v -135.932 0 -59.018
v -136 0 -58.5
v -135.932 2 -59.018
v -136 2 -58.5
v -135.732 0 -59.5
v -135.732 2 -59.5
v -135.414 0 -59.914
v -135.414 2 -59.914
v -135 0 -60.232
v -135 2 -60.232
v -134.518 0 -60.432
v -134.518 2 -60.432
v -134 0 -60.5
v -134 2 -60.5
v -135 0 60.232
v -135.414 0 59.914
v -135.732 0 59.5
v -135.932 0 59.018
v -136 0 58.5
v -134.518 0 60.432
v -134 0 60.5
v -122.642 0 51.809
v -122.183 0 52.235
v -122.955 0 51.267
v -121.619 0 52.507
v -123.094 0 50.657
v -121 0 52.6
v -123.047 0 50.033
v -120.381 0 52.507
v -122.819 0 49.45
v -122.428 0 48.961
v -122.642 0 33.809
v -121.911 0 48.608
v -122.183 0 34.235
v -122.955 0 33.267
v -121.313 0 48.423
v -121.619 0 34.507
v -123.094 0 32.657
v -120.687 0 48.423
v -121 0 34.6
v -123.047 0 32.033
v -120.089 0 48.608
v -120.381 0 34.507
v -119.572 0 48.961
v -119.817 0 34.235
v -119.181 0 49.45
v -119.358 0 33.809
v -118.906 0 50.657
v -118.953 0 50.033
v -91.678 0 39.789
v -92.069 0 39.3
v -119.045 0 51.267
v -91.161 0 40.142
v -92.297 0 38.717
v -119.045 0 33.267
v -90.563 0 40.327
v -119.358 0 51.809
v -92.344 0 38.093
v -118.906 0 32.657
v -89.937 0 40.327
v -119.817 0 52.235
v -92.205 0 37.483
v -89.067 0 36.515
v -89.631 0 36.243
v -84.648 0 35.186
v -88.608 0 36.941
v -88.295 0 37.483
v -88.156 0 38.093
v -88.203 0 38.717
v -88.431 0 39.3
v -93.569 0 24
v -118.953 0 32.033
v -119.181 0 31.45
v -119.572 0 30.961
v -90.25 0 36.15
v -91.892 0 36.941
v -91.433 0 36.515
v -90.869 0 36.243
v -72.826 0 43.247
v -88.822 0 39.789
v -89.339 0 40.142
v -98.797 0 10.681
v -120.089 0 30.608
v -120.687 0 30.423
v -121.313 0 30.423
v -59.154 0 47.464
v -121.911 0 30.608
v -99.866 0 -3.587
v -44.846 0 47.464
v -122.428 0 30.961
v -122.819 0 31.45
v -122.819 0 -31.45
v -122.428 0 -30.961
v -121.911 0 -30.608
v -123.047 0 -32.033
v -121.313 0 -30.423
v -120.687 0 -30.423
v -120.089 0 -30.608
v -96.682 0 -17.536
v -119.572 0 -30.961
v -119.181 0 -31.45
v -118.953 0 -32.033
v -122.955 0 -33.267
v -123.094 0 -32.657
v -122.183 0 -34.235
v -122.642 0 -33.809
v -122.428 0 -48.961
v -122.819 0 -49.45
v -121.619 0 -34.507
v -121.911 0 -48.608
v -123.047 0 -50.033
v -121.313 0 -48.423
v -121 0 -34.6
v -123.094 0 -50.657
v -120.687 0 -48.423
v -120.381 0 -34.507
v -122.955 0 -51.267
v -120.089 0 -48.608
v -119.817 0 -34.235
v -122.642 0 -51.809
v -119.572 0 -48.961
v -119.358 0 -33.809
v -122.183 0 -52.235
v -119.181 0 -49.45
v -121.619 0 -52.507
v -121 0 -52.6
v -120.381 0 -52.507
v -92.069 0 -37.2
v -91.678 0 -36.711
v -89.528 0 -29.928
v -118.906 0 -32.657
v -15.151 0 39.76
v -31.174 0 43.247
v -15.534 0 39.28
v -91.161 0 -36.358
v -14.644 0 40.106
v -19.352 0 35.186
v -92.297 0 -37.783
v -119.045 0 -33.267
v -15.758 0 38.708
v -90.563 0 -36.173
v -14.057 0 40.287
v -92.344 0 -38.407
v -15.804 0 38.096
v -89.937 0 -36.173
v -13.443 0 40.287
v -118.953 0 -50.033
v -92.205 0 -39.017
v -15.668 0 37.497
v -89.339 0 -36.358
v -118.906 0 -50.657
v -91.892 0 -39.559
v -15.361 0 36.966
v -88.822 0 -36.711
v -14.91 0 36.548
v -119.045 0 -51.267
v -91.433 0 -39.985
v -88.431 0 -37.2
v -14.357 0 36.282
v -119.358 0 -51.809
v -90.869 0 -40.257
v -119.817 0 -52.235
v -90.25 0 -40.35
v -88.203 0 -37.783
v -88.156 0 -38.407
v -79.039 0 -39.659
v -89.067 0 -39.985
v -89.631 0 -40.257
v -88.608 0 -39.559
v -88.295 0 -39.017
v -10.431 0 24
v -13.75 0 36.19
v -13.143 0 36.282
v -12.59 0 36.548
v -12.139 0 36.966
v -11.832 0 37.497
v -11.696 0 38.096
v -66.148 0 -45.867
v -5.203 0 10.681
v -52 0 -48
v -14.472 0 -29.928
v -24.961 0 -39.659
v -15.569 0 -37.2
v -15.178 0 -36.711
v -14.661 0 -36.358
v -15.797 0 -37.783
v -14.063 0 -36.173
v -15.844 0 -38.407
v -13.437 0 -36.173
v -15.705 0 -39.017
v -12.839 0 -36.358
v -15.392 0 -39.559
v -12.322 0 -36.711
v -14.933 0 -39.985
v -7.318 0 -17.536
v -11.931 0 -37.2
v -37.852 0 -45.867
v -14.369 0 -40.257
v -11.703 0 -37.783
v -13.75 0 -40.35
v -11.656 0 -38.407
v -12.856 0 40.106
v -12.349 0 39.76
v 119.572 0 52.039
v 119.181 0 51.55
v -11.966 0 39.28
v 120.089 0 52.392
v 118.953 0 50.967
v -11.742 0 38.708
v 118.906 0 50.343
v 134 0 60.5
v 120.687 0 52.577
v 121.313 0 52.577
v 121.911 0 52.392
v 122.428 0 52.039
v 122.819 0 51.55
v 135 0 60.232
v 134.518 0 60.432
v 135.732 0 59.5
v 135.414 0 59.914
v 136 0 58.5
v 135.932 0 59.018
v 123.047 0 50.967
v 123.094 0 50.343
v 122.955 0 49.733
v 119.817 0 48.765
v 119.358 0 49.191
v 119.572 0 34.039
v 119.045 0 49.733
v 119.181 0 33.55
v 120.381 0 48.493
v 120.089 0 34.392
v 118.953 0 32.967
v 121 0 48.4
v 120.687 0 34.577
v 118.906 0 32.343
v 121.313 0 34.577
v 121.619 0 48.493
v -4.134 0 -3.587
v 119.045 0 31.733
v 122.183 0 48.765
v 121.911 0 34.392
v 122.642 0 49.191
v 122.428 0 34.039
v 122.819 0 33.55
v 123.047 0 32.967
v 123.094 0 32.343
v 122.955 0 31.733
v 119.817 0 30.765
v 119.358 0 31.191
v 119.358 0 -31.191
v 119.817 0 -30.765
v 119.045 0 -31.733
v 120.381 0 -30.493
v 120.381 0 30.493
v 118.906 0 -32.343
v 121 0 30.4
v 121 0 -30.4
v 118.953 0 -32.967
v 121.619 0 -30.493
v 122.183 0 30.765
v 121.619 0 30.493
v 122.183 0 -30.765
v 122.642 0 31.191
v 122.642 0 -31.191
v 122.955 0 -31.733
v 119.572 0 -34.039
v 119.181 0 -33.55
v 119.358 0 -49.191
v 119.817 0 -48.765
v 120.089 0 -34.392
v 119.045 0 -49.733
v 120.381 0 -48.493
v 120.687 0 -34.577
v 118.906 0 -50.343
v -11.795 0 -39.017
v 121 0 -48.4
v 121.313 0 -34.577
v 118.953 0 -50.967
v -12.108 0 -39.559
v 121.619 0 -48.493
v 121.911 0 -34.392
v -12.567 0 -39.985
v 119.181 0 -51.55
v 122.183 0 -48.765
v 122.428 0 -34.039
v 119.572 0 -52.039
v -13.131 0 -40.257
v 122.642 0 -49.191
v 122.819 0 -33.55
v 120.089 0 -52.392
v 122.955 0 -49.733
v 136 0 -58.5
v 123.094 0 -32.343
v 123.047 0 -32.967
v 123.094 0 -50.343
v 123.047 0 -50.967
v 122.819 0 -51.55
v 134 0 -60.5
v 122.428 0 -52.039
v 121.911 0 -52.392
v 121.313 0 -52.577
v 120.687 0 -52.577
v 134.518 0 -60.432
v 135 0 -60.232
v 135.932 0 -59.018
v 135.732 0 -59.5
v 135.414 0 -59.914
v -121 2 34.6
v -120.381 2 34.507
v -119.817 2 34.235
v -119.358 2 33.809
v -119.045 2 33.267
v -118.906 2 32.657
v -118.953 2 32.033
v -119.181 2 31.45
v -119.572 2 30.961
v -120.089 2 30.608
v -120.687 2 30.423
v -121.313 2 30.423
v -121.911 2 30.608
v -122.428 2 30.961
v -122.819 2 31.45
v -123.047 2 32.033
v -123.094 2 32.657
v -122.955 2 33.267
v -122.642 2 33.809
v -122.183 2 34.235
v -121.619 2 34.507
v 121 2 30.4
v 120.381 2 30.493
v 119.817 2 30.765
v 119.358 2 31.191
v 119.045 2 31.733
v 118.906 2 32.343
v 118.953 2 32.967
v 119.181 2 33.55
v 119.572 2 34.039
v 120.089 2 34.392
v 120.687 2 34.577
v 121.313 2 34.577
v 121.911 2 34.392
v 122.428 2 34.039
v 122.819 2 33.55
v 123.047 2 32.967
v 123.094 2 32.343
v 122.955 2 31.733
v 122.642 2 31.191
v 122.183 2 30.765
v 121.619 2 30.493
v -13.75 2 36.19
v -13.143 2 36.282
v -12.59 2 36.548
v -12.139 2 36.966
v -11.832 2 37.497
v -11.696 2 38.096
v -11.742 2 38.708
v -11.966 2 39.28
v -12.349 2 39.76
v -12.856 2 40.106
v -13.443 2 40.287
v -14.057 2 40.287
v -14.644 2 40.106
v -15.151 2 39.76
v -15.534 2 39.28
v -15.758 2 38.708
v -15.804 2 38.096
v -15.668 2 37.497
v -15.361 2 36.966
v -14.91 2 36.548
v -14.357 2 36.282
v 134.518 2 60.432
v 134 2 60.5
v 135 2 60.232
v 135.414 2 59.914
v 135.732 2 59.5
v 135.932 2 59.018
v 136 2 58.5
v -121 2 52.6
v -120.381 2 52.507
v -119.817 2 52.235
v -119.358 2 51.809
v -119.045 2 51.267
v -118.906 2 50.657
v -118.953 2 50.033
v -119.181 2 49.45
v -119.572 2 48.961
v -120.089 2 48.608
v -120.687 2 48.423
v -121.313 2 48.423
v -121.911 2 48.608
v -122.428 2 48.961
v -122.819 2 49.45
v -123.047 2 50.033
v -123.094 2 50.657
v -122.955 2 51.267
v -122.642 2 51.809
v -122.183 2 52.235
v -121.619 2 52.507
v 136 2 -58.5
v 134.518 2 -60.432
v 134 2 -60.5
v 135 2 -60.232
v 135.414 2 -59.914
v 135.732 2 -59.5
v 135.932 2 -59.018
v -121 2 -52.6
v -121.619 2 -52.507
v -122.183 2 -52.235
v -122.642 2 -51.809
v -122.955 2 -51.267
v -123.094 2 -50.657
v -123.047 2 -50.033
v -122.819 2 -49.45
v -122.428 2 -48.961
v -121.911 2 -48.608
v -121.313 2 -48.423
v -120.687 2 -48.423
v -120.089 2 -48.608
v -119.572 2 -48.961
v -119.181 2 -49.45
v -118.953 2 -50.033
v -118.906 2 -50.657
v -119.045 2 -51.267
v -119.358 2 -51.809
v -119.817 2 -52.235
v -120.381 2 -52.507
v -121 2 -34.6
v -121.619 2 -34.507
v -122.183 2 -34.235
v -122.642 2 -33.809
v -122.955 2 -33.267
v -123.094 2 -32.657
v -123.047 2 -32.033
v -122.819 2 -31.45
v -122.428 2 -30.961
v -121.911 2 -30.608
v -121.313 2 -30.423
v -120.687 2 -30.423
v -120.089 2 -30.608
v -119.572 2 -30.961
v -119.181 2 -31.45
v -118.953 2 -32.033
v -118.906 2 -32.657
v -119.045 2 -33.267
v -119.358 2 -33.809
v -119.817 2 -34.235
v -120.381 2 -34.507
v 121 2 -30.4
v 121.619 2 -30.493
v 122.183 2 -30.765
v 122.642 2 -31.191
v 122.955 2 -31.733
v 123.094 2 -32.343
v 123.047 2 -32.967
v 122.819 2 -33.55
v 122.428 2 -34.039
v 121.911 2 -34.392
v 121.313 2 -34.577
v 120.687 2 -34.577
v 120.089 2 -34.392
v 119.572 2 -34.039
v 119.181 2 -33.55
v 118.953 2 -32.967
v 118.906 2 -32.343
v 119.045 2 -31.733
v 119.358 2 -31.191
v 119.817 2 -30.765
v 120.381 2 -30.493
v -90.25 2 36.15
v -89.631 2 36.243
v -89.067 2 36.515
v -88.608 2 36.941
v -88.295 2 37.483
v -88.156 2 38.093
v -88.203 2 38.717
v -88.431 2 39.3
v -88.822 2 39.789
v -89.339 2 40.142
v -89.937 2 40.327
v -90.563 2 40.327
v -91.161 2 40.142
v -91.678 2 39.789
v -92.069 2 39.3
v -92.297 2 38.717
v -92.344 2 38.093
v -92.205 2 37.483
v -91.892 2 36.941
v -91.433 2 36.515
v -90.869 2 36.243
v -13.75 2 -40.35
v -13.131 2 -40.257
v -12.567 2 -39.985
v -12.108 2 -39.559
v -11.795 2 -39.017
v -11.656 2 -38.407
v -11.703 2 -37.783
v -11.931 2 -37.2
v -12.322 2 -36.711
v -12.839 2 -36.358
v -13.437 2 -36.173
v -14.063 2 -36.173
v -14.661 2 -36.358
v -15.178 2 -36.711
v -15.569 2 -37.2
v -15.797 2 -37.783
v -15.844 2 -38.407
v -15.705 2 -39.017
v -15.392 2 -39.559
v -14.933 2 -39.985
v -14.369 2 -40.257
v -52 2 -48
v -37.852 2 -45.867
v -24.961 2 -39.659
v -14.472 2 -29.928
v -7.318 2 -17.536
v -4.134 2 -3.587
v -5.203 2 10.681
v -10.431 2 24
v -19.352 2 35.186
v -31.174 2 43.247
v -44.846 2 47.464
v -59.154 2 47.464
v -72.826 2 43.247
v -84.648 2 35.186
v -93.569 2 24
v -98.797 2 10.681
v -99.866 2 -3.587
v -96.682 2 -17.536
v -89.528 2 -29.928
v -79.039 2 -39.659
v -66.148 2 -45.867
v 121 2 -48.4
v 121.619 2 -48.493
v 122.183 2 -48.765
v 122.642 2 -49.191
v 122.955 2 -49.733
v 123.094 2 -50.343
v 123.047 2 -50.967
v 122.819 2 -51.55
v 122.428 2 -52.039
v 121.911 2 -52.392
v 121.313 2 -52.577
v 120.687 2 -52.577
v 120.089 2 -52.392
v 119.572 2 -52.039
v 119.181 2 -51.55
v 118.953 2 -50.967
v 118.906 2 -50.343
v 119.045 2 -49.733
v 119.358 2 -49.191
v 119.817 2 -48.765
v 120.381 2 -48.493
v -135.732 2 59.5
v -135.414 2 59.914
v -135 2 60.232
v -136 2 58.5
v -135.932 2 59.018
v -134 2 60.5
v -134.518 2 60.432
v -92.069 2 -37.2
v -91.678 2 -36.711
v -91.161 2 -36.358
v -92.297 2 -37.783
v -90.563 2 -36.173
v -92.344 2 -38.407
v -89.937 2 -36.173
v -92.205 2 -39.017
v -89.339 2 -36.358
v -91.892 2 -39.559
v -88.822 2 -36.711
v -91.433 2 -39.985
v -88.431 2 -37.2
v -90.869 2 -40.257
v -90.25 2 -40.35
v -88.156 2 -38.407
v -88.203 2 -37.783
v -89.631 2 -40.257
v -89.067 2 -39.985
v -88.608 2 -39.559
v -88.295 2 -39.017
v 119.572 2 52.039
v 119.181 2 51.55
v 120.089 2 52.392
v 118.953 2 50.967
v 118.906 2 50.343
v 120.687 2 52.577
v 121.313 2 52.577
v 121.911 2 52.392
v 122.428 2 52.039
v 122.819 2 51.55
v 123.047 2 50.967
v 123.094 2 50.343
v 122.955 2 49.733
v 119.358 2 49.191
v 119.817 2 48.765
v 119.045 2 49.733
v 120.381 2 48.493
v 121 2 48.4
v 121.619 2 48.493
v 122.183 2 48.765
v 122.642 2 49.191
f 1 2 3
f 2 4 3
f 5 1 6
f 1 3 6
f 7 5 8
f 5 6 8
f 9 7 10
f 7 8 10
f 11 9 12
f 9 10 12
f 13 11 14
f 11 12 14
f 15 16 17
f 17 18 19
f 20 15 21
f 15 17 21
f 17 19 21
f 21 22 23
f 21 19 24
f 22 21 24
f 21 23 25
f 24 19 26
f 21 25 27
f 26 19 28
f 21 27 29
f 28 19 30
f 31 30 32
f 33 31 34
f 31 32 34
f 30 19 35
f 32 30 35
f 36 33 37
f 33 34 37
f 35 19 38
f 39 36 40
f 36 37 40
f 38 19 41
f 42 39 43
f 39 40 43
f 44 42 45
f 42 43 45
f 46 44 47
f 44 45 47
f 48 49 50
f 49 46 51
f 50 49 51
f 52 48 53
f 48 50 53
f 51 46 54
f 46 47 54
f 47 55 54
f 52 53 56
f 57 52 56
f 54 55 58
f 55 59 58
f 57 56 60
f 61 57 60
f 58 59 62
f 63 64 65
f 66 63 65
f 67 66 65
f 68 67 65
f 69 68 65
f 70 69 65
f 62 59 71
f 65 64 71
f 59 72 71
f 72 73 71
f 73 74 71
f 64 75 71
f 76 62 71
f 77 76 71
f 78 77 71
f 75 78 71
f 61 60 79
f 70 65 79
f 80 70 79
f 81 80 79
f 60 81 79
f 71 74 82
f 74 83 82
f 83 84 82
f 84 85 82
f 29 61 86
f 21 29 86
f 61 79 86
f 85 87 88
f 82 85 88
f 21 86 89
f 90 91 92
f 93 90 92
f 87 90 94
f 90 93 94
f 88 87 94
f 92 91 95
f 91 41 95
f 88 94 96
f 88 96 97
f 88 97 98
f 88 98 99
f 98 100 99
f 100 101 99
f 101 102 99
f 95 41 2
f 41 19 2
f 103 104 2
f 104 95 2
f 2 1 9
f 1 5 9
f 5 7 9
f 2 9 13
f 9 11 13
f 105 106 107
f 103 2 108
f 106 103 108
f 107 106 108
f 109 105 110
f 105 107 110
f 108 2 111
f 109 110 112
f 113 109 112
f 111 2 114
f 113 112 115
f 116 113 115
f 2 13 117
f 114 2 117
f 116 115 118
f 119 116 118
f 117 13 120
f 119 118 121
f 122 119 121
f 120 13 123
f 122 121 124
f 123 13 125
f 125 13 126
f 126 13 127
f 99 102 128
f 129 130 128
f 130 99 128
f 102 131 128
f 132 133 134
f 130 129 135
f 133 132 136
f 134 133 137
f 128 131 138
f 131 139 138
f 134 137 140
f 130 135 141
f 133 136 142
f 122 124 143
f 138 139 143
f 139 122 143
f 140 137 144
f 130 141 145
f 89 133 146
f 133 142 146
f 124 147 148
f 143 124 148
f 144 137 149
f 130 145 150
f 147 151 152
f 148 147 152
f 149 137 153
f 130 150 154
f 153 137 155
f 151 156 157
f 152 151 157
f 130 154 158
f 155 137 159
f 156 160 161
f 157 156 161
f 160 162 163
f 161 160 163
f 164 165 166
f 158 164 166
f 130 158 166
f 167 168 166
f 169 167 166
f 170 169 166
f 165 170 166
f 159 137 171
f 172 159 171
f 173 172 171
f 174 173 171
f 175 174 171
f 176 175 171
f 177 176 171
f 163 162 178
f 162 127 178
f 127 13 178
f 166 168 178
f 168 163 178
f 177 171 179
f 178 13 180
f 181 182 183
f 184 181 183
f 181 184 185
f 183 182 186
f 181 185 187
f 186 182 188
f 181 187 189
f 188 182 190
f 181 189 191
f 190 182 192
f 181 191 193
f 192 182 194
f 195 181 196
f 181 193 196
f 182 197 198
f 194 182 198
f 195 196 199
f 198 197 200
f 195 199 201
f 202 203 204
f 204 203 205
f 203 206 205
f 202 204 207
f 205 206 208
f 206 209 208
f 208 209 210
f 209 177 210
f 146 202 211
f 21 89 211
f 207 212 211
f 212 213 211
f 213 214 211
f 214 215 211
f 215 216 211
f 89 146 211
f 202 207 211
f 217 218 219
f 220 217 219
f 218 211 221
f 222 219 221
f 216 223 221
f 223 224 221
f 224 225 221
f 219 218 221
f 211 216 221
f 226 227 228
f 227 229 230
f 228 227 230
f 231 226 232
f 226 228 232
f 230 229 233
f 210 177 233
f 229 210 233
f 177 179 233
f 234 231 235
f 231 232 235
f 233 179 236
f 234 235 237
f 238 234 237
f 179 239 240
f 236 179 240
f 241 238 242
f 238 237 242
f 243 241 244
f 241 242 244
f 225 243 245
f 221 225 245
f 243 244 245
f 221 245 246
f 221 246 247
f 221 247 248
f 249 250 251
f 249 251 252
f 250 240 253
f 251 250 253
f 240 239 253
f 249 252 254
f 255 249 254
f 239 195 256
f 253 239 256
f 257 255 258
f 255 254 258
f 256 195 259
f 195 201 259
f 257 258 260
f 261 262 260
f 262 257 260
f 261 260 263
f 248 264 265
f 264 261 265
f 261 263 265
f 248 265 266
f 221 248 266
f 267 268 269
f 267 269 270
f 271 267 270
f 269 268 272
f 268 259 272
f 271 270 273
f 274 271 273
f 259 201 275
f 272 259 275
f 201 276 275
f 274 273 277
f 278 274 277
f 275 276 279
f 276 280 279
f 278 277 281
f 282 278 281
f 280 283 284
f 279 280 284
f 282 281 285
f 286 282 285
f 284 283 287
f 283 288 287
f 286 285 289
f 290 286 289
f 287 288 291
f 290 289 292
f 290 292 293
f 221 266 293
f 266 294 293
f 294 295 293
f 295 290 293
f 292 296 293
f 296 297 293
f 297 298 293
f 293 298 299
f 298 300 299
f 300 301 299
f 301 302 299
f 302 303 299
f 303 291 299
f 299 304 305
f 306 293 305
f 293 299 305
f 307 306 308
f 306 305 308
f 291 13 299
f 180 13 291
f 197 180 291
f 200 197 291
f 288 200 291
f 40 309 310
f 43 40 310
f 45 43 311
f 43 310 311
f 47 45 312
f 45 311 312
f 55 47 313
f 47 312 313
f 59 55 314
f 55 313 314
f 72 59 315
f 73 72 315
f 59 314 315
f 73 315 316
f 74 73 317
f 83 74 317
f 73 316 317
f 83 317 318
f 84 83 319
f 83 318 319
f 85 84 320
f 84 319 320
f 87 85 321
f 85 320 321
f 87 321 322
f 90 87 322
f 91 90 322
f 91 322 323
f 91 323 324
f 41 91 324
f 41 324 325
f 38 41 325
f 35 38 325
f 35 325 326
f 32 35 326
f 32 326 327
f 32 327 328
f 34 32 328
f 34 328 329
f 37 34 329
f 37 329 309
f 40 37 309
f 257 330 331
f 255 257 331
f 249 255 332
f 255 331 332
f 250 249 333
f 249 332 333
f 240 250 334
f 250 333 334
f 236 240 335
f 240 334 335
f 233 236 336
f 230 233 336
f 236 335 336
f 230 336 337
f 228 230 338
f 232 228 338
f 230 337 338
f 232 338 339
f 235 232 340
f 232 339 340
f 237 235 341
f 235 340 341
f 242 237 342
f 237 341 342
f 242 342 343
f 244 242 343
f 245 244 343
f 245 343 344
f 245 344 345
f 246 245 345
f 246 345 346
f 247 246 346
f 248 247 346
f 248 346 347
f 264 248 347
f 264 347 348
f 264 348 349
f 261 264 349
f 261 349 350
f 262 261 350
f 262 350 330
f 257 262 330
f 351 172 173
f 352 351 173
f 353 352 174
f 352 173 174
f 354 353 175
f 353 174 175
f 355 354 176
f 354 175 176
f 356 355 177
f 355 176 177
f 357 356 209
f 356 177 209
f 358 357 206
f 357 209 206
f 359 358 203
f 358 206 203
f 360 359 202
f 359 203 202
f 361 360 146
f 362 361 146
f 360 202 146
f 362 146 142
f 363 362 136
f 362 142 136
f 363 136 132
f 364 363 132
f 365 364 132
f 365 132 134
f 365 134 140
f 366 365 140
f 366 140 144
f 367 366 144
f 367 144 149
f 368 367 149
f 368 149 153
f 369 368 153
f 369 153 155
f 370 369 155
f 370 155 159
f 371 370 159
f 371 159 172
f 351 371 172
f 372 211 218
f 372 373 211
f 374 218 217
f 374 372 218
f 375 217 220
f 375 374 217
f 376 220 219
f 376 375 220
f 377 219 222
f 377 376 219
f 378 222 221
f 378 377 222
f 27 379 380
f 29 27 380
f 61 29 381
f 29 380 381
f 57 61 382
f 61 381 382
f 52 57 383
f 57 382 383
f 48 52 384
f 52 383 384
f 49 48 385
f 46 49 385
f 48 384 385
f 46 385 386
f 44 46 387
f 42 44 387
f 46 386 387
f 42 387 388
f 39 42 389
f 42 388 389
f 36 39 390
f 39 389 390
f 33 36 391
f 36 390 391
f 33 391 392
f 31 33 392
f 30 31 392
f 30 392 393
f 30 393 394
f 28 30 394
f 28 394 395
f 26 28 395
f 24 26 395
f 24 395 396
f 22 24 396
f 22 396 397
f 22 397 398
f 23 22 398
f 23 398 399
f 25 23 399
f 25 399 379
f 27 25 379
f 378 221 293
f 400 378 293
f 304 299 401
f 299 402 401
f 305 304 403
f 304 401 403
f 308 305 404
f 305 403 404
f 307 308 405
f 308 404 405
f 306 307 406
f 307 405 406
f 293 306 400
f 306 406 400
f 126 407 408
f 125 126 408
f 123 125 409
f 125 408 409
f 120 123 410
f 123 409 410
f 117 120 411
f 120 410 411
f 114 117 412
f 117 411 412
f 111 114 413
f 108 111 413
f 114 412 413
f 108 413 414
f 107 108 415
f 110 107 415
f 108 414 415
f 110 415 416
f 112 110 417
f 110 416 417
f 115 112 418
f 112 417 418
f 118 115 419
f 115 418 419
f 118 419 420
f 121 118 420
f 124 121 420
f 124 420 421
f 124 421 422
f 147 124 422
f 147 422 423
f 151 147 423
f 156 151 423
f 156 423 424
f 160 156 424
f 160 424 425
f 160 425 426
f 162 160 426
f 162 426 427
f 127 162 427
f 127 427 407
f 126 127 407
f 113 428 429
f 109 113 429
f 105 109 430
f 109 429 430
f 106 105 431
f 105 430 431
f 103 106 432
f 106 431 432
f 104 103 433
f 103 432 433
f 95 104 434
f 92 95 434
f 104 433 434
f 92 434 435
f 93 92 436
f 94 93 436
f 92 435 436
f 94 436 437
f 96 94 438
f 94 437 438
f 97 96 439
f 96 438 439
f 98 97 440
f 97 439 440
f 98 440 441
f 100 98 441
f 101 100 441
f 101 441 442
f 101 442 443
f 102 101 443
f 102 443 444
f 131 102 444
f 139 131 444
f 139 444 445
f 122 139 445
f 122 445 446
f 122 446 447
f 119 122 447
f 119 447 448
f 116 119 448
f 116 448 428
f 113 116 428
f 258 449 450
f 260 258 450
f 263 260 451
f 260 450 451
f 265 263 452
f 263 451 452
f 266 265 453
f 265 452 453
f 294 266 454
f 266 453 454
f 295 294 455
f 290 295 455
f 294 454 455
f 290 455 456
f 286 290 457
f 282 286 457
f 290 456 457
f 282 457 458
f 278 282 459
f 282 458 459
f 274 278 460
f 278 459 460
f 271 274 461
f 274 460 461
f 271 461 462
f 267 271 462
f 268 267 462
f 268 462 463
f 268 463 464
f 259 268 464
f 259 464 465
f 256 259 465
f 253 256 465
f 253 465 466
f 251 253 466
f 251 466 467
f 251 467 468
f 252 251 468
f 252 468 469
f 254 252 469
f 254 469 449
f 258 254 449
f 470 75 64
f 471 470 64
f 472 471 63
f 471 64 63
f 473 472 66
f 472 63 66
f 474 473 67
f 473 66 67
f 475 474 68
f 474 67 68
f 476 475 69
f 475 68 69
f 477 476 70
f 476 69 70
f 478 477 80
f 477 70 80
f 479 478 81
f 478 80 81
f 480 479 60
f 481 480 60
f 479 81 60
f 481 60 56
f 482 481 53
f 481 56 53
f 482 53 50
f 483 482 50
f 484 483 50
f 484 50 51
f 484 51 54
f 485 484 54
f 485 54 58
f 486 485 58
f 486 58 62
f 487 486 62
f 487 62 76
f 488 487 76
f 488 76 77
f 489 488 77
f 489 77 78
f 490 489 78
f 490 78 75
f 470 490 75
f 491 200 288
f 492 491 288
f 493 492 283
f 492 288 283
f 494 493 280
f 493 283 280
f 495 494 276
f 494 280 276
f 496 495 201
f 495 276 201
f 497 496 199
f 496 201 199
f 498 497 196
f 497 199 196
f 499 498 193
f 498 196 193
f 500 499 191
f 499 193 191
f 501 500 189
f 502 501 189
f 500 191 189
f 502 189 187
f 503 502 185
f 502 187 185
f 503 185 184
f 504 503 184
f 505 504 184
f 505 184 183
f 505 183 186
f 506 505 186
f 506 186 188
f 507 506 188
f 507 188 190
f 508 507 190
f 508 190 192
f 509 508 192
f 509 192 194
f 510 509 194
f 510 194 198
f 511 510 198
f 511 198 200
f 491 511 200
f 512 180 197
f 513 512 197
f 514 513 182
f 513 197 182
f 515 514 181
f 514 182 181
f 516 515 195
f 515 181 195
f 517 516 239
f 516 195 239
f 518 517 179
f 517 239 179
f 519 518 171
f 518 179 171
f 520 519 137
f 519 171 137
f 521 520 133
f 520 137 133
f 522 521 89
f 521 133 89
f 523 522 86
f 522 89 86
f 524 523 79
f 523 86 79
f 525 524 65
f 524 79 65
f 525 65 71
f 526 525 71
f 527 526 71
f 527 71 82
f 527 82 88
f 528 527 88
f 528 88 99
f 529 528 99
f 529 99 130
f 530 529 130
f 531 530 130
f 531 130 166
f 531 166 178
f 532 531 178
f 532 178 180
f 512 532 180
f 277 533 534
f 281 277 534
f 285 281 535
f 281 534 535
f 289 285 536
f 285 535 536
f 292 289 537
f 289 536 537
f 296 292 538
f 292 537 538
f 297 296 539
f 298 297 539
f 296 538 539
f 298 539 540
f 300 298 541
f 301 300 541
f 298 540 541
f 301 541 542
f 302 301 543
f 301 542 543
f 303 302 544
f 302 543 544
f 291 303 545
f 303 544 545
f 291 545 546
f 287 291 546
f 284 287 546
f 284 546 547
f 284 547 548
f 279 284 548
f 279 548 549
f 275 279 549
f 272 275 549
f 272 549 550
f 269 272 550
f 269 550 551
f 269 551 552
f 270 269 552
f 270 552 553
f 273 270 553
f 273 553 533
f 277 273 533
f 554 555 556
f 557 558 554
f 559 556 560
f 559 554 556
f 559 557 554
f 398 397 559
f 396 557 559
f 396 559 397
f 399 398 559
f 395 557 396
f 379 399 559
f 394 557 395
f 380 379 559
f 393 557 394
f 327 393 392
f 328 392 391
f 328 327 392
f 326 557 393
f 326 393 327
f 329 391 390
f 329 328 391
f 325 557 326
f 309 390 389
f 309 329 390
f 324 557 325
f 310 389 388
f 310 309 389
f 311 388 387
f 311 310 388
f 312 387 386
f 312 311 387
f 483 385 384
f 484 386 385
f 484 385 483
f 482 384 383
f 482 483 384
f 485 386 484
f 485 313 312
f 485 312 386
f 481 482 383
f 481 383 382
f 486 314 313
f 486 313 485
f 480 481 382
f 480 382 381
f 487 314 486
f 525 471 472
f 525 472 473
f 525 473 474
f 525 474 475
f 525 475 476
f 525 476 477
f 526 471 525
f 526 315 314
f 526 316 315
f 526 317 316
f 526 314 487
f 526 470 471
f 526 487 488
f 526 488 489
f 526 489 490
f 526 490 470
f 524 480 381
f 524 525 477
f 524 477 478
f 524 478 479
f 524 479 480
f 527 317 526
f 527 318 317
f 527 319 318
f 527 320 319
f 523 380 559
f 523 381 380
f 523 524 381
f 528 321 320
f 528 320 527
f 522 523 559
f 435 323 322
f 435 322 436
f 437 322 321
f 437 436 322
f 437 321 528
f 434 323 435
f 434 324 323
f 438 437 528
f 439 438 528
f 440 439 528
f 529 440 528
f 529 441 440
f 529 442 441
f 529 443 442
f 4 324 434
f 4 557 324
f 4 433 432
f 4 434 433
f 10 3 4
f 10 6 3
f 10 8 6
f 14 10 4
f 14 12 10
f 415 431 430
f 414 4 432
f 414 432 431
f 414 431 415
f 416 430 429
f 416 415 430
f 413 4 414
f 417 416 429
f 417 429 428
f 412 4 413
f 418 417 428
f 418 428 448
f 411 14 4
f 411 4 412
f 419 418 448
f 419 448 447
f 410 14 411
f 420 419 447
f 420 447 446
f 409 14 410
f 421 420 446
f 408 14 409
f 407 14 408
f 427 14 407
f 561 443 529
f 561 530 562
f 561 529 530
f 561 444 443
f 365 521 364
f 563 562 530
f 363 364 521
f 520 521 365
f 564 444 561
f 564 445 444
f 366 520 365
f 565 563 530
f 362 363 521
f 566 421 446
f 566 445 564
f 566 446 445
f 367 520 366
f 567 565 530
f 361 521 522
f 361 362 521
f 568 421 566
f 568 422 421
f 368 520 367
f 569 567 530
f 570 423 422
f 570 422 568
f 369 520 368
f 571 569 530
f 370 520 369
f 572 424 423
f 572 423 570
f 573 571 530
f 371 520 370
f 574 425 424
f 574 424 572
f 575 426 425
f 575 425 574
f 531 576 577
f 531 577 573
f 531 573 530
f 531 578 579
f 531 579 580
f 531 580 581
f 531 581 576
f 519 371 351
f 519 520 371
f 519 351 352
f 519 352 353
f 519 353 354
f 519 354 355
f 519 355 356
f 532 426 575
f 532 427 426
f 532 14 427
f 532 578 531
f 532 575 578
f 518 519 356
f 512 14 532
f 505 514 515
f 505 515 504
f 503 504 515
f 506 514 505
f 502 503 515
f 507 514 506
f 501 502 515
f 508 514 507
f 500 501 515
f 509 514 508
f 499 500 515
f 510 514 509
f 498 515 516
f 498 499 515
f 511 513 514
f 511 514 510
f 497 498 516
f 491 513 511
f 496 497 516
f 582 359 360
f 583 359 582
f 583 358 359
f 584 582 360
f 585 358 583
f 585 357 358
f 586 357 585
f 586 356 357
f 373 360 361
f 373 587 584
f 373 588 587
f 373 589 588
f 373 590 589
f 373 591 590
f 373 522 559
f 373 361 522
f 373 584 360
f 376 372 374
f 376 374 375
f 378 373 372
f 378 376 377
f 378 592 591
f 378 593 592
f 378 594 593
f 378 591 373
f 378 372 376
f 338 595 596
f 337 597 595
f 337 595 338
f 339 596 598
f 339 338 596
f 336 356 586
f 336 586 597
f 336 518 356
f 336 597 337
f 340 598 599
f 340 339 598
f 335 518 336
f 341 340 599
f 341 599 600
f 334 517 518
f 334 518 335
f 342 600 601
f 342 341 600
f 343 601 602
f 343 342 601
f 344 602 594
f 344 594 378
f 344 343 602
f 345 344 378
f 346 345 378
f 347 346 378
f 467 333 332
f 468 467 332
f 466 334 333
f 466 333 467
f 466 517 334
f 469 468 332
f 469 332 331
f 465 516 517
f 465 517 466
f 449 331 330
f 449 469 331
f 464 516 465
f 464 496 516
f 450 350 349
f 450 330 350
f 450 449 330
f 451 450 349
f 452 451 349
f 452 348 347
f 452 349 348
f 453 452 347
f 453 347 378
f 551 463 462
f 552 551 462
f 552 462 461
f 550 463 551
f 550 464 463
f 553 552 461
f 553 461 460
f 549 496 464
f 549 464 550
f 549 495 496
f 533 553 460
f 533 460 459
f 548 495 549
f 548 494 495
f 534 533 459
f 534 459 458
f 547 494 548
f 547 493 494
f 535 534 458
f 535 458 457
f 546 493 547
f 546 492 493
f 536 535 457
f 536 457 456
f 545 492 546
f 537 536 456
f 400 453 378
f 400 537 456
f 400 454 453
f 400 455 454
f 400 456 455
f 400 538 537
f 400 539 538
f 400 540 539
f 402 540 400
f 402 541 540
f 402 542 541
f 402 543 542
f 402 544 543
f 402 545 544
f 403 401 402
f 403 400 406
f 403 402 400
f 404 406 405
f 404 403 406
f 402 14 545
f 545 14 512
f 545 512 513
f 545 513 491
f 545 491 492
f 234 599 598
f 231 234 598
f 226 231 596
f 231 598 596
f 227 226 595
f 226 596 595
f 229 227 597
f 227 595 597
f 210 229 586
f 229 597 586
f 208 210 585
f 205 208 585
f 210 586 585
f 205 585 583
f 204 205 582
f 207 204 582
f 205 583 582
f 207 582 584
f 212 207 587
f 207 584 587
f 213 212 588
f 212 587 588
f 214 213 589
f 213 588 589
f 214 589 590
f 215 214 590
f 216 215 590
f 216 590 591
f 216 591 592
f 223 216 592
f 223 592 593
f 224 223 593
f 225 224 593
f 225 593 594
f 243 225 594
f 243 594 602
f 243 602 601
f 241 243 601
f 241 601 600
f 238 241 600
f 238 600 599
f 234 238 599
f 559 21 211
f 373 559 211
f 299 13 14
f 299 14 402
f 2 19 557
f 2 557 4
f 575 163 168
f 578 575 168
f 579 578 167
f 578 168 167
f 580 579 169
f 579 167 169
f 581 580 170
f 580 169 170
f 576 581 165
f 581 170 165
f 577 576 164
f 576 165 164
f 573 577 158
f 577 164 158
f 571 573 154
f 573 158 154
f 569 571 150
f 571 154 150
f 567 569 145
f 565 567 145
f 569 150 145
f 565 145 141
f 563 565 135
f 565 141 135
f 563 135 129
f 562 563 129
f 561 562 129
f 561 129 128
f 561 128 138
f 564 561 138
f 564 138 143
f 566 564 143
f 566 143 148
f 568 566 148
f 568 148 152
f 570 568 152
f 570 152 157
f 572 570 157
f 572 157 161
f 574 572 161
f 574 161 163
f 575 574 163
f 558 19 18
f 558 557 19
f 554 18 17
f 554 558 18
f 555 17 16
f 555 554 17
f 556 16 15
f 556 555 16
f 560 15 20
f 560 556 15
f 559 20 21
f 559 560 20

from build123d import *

# Parameters (mm, degrees)
SKETCH_1_W          = 272
SKETCH_1_H          = 121
EXTRUDE_1_DEPTH     = 2
SKETCH_2_R          = 2.1
CUT_EXTRUDE_1_DEPTH = 149.863192227
FILLET_1_R          = 2
SKETCH_3_R          = 2.1
SKETCH_3_R_2        = 2.06
SKETCH_3_R_3        = 48
CUT_EXTRUDE_2_DEPTH = 149.863192227


with BuildPart() as part:
    # 草图1 → 凸台-拉伸1 (new body)
    with BuildSketch(Plane(origin=(0, 0, 0), x_dir=(1, 0, 0), z_dir=(0, 1, 0))):
        Rectangle(SKETCH_1_W, SKETCH_1_H)
    extrude(amount=EXTRUDE_1_DEPTH)

    # 草图2 → 切除-拉伸1 (cut, through all)
    with BuildSketch(Plane(origin=(0, 2, 0), x_dir=(1, 0, 0), z_dir=(0, 1, 0))):
        with Locations(Location((121, 50.5, 0), (0, 0, 270))):
            Circle(SKETCH_2_R)
        with Locations(Location((121, 32.5, 0), (0, 0, 270))):
            Circle(SKETCH_2_R)
        with Locations(Location((121, -32.5, 0), (0, 0, 90))):
            Circle(SKETCH_2_R)
        with Locations(Location((121, -50.5, 0), (0, 0, 90))):
            Circle(SKETCH_2_R)
        with Locations(Location((-121, -50.5, 0), (0, 0, 270))):
            Circle(SKETCH_2_R)
        with Locations(Location((-121, -32.5, 0), (0, 0, 270))):
            Circle(SKETCH_2_R)
        with Locations(Location((-121, 32.5, 0), (0, 0, 90))):
            Circle(SKETCH_2_R)
        with Locations(Location((-121, 50.5, 0), (0, 0, 90))):
            Circle(SKETCH_2_R)
    extrude(amount=-CUT_EXTRUDE_1_DEPTH, mode=Mode.SUBTRACT)

    # 圆角1
    fillet_1_edges = [part.edges().sort_by_distance(p)[0] for p in [
        (136, 1, 60.5),
        (-136, 1, 60.5),
        (-136, 1, -60.5),
        (136, 1, -60.5),
    ]]
    fillet(fillet_1_edges, radius=FILLET_1_R)

    # 草图3 → 切除-拉伸2 (cut, through all)
    with BuildSketch(Plane.XZ):
        with Locations(Location((-13.75, -38.25, 0), (0, 0, 270))):
            Circle(SKETCH_3_R)
        with Locations(Location((-13.75, 38.25, 0), (0, 0, 270))):
            Circle(SKETCH_3_R_2)
        with Locations(Location((-90.25, 38.25, 0), (0, 0, 270))):
            Circle(SKETCH_3_R)
        with Locations(Location((-90.25, -38.25, 0), (0, 0, 270))):
            Circle(SKETCH_3_R)
        with Locations(Location((-52, 0, 0), (0, 0, 270))):
            Circle(SKETCH_3_R_3)
    extrude(amount=-CUT_EXTRUDE_2_DEPTH, mode=Mode.SUBTRACT)


solid = part.part
